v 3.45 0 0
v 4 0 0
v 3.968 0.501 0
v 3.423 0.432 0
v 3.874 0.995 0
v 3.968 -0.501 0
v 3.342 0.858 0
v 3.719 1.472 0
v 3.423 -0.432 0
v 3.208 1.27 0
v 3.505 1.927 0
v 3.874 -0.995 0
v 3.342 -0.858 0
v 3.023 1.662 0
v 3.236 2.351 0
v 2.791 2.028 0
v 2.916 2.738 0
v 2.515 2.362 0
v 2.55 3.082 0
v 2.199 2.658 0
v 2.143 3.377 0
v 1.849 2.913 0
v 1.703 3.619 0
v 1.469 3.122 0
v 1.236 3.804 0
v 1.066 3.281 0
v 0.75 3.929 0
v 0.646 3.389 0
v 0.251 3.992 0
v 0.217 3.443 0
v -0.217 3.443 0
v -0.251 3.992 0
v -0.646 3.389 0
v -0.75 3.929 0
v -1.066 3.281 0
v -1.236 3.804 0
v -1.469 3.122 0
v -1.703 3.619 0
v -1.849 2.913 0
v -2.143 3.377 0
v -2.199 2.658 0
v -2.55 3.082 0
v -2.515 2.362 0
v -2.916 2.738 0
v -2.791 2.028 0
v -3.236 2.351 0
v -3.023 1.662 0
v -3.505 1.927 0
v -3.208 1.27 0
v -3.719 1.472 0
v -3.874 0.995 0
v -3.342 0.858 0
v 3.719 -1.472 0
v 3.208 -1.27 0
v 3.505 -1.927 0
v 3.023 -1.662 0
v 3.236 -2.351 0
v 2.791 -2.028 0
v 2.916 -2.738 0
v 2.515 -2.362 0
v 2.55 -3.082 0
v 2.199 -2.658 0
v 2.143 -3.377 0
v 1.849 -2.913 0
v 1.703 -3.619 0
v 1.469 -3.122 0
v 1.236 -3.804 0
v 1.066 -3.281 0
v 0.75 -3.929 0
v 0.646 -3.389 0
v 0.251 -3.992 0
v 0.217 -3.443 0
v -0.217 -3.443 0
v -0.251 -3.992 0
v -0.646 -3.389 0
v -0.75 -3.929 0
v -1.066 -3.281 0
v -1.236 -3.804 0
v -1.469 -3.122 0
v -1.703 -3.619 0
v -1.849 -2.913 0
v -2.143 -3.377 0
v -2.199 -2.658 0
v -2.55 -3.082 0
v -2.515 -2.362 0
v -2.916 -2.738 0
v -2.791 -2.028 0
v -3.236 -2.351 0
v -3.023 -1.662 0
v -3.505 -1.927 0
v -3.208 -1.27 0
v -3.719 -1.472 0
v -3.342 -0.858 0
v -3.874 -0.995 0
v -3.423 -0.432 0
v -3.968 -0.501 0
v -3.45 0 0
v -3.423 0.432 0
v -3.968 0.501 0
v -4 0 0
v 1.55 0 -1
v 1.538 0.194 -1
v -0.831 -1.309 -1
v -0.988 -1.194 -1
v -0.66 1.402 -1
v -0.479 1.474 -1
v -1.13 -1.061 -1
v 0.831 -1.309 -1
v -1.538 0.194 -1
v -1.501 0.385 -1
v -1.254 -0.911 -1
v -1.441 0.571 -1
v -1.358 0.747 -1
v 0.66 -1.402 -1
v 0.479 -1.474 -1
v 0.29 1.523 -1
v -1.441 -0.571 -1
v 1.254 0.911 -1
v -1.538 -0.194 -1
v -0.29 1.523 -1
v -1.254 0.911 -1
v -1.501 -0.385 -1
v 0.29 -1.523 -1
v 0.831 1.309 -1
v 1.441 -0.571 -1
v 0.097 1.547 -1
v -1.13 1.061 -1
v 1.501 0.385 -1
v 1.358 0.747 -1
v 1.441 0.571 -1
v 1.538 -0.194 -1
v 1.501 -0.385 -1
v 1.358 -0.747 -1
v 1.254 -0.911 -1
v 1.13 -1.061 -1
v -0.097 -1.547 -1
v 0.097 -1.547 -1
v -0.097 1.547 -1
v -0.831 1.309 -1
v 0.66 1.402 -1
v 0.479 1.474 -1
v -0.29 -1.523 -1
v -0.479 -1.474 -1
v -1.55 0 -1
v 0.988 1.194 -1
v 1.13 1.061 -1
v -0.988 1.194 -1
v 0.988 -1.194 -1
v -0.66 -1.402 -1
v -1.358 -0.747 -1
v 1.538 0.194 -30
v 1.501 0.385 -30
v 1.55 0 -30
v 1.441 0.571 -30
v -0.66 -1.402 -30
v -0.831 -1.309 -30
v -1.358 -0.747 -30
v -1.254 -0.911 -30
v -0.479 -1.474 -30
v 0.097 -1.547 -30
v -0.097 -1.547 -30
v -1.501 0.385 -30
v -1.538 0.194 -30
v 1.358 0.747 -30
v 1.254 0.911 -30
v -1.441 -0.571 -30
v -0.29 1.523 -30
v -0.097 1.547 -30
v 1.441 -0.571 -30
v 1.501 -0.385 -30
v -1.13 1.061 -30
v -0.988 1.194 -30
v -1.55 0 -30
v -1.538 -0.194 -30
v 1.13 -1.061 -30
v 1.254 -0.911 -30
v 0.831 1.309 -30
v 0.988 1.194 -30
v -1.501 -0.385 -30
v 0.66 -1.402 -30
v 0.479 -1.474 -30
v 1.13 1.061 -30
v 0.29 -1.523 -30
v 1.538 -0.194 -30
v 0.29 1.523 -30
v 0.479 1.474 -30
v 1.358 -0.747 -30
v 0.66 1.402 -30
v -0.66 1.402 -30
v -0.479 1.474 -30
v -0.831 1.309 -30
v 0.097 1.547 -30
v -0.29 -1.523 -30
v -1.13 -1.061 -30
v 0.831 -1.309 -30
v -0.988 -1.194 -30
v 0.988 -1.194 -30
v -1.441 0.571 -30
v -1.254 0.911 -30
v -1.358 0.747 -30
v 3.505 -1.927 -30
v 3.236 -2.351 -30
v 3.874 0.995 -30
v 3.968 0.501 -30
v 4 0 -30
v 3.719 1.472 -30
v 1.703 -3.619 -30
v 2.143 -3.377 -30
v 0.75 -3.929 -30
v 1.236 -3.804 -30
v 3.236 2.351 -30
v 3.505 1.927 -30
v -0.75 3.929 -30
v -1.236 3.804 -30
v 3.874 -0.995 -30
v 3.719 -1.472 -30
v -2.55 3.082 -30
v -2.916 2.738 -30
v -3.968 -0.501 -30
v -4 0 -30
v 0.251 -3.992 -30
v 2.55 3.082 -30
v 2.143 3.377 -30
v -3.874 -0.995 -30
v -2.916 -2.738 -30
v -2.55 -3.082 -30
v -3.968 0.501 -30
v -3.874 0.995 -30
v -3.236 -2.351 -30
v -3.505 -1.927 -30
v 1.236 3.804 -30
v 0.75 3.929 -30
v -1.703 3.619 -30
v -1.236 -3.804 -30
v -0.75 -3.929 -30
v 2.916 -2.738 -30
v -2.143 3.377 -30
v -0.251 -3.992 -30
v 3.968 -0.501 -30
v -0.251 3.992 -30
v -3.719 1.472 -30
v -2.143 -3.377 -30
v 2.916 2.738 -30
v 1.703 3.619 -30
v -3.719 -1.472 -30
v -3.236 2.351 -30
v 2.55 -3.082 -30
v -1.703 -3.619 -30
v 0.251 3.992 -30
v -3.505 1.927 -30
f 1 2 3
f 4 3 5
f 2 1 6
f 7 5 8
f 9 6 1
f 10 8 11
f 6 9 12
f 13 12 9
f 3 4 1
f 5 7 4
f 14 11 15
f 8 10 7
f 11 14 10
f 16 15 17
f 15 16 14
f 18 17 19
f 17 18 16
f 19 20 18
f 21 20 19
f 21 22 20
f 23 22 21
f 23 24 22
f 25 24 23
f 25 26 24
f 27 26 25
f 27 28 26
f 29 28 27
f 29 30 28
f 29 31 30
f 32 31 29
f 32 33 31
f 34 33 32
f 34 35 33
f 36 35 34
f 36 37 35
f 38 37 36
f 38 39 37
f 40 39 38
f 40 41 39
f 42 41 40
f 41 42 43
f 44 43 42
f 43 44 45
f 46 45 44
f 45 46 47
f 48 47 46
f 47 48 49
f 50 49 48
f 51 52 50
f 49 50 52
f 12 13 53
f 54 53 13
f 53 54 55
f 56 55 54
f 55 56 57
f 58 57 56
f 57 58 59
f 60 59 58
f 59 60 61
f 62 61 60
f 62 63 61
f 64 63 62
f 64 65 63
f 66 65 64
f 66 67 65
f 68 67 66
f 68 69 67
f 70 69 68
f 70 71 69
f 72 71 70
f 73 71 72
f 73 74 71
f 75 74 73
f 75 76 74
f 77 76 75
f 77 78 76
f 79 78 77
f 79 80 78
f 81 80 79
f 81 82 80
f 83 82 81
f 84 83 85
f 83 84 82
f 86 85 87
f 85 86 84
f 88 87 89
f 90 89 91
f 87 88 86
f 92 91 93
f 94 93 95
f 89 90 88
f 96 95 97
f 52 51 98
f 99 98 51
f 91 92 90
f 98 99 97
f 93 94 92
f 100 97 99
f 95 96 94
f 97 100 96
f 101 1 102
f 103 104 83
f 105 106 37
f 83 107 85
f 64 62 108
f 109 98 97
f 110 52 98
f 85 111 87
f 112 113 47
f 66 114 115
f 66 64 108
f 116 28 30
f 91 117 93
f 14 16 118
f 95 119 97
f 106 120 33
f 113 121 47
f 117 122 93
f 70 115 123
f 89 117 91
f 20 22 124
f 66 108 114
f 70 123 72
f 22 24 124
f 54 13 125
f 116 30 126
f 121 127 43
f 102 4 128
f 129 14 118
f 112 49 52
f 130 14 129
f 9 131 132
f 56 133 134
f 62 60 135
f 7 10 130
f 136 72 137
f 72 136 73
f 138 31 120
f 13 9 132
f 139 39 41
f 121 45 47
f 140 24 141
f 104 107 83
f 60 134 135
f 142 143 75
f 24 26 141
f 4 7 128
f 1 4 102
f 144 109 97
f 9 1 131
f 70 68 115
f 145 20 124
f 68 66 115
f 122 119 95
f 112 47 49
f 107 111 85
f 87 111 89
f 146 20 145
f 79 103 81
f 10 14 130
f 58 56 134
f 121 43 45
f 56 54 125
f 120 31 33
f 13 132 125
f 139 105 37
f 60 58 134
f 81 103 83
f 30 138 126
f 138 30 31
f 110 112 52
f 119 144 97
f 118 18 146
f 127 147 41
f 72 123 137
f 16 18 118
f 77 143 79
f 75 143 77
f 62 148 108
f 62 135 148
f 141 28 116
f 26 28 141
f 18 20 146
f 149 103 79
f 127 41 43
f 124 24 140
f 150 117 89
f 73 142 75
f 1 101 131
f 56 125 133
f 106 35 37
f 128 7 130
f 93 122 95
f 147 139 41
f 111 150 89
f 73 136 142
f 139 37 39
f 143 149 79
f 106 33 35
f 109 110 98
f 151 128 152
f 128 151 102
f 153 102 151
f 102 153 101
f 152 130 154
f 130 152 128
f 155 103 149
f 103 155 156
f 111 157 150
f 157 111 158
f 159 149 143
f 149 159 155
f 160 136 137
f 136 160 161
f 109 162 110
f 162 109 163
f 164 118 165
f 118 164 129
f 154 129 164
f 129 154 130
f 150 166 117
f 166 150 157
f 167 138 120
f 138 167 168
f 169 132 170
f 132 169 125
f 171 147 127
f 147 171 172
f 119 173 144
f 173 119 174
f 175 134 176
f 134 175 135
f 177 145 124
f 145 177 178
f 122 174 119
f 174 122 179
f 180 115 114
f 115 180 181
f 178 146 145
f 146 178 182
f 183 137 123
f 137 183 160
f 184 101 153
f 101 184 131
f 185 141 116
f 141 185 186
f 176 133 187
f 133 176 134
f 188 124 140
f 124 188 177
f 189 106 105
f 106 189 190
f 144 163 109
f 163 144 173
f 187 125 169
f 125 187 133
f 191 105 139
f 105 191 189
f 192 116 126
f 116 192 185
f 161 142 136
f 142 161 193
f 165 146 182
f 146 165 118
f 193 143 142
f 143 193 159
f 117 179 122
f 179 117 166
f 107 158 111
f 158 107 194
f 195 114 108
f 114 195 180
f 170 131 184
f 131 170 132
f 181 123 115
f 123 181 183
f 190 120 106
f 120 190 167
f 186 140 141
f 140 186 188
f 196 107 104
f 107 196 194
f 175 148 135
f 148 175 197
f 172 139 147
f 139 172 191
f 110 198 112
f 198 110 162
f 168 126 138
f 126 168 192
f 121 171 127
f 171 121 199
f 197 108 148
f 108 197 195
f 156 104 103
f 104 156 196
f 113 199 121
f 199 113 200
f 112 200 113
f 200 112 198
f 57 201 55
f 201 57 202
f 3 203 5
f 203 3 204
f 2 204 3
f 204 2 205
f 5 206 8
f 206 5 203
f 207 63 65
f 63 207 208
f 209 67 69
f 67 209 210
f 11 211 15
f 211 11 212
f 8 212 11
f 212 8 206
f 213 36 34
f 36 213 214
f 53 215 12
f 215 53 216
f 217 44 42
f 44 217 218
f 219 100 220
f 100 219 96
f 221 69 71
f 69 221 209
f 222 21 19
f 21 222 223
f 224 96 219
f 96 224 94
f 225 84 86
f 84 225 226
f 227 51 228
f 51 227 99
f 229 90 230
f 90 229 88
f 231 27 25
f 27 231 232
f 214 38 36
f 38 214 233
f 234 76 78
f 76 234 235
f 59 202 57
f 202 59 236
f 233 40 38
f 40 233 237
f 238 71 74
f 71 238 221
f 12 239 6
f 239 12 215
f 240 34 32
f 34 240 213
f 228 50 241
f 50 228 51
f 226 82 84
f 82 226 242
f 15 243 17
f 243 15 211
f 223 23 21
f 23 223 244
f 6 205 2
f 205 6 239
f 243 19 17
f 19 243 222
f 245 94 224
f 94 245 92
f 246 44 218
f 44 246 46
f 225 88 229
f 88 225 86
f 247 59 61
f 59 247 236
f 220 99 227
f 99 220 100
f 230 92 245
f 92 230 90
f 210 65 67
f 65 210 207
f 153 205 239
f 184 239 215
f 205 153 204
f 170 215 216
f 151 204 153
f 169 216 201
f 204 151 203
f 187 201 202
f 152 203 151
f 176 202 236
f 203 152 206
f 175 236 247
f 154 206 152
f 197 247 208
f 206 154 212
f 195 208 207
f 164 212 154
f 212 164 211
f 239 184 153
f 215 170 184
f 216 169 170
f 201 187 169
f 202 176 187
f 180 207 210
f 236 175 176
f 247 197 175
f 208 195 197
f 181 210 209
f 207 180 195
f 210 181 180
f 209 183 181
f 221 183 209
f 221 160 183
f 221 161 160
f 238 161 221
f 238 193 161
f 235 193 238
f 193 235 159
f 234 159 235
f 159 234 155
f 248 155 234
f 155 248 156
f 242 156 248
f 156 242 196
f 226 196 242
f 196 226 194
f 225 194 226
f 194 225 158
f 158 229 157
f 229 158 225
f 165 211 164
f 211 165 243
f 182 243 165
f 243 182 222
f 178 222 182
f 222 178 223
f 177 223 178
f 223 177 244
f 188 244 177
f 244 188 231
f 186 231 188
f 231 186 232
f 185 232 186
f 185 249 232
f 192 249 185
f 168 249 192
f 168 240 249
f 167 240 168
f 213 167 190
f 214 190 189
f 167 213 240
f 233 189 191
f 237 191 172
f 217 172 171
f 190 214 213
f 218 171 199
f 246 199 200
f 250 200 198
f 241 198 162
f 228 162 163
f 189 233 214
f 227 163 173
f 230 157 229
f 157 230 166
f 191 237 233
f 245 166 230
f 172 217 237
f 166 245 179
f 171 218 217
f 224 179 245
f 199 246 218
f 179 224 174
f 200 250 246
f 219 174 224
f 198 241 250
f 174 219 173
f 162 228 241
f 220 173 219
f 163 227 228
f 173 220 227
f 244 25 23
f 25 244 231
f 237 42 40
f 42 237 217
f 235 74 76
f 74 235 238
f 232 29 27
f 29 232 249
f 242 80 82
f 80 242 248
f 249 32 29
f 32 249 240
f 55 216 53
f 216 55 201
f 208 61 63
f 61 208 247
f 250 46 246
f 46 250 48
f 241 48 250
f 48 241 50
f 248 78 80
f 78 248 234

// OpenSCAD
$fn = 50;

difference() {
	union() {
		translate(v = [0, 0, -30.0]) {
			cylinder(h = 33, r = 4.0);
		}
	}
	union() {
		translate(v = [0, 0, 0]) {
			rotate(a = [0, 0, 0]) {
				difference() {
					union() {
						translate(v = [0, 0, -33.0]) {
							cylinder(h = 33, r = 1.25);
						}
						translate(v = [0, 0, -1.0]) {
							cylinder(h = 1.0, r1 = 1.55, r2 = 3.45);
						}
						translate(v = [0, 0, -33.0]) {
							cylinder(h = 33, r = 1.55);
						}
						translate(v = [0, 0, -33.0]) {
							cylinder(h = 33, r = 1.25);
						}
					}
					union();
				}
			}
		}
		#cylinder(h = 3, r = 5.0);
	}
}
